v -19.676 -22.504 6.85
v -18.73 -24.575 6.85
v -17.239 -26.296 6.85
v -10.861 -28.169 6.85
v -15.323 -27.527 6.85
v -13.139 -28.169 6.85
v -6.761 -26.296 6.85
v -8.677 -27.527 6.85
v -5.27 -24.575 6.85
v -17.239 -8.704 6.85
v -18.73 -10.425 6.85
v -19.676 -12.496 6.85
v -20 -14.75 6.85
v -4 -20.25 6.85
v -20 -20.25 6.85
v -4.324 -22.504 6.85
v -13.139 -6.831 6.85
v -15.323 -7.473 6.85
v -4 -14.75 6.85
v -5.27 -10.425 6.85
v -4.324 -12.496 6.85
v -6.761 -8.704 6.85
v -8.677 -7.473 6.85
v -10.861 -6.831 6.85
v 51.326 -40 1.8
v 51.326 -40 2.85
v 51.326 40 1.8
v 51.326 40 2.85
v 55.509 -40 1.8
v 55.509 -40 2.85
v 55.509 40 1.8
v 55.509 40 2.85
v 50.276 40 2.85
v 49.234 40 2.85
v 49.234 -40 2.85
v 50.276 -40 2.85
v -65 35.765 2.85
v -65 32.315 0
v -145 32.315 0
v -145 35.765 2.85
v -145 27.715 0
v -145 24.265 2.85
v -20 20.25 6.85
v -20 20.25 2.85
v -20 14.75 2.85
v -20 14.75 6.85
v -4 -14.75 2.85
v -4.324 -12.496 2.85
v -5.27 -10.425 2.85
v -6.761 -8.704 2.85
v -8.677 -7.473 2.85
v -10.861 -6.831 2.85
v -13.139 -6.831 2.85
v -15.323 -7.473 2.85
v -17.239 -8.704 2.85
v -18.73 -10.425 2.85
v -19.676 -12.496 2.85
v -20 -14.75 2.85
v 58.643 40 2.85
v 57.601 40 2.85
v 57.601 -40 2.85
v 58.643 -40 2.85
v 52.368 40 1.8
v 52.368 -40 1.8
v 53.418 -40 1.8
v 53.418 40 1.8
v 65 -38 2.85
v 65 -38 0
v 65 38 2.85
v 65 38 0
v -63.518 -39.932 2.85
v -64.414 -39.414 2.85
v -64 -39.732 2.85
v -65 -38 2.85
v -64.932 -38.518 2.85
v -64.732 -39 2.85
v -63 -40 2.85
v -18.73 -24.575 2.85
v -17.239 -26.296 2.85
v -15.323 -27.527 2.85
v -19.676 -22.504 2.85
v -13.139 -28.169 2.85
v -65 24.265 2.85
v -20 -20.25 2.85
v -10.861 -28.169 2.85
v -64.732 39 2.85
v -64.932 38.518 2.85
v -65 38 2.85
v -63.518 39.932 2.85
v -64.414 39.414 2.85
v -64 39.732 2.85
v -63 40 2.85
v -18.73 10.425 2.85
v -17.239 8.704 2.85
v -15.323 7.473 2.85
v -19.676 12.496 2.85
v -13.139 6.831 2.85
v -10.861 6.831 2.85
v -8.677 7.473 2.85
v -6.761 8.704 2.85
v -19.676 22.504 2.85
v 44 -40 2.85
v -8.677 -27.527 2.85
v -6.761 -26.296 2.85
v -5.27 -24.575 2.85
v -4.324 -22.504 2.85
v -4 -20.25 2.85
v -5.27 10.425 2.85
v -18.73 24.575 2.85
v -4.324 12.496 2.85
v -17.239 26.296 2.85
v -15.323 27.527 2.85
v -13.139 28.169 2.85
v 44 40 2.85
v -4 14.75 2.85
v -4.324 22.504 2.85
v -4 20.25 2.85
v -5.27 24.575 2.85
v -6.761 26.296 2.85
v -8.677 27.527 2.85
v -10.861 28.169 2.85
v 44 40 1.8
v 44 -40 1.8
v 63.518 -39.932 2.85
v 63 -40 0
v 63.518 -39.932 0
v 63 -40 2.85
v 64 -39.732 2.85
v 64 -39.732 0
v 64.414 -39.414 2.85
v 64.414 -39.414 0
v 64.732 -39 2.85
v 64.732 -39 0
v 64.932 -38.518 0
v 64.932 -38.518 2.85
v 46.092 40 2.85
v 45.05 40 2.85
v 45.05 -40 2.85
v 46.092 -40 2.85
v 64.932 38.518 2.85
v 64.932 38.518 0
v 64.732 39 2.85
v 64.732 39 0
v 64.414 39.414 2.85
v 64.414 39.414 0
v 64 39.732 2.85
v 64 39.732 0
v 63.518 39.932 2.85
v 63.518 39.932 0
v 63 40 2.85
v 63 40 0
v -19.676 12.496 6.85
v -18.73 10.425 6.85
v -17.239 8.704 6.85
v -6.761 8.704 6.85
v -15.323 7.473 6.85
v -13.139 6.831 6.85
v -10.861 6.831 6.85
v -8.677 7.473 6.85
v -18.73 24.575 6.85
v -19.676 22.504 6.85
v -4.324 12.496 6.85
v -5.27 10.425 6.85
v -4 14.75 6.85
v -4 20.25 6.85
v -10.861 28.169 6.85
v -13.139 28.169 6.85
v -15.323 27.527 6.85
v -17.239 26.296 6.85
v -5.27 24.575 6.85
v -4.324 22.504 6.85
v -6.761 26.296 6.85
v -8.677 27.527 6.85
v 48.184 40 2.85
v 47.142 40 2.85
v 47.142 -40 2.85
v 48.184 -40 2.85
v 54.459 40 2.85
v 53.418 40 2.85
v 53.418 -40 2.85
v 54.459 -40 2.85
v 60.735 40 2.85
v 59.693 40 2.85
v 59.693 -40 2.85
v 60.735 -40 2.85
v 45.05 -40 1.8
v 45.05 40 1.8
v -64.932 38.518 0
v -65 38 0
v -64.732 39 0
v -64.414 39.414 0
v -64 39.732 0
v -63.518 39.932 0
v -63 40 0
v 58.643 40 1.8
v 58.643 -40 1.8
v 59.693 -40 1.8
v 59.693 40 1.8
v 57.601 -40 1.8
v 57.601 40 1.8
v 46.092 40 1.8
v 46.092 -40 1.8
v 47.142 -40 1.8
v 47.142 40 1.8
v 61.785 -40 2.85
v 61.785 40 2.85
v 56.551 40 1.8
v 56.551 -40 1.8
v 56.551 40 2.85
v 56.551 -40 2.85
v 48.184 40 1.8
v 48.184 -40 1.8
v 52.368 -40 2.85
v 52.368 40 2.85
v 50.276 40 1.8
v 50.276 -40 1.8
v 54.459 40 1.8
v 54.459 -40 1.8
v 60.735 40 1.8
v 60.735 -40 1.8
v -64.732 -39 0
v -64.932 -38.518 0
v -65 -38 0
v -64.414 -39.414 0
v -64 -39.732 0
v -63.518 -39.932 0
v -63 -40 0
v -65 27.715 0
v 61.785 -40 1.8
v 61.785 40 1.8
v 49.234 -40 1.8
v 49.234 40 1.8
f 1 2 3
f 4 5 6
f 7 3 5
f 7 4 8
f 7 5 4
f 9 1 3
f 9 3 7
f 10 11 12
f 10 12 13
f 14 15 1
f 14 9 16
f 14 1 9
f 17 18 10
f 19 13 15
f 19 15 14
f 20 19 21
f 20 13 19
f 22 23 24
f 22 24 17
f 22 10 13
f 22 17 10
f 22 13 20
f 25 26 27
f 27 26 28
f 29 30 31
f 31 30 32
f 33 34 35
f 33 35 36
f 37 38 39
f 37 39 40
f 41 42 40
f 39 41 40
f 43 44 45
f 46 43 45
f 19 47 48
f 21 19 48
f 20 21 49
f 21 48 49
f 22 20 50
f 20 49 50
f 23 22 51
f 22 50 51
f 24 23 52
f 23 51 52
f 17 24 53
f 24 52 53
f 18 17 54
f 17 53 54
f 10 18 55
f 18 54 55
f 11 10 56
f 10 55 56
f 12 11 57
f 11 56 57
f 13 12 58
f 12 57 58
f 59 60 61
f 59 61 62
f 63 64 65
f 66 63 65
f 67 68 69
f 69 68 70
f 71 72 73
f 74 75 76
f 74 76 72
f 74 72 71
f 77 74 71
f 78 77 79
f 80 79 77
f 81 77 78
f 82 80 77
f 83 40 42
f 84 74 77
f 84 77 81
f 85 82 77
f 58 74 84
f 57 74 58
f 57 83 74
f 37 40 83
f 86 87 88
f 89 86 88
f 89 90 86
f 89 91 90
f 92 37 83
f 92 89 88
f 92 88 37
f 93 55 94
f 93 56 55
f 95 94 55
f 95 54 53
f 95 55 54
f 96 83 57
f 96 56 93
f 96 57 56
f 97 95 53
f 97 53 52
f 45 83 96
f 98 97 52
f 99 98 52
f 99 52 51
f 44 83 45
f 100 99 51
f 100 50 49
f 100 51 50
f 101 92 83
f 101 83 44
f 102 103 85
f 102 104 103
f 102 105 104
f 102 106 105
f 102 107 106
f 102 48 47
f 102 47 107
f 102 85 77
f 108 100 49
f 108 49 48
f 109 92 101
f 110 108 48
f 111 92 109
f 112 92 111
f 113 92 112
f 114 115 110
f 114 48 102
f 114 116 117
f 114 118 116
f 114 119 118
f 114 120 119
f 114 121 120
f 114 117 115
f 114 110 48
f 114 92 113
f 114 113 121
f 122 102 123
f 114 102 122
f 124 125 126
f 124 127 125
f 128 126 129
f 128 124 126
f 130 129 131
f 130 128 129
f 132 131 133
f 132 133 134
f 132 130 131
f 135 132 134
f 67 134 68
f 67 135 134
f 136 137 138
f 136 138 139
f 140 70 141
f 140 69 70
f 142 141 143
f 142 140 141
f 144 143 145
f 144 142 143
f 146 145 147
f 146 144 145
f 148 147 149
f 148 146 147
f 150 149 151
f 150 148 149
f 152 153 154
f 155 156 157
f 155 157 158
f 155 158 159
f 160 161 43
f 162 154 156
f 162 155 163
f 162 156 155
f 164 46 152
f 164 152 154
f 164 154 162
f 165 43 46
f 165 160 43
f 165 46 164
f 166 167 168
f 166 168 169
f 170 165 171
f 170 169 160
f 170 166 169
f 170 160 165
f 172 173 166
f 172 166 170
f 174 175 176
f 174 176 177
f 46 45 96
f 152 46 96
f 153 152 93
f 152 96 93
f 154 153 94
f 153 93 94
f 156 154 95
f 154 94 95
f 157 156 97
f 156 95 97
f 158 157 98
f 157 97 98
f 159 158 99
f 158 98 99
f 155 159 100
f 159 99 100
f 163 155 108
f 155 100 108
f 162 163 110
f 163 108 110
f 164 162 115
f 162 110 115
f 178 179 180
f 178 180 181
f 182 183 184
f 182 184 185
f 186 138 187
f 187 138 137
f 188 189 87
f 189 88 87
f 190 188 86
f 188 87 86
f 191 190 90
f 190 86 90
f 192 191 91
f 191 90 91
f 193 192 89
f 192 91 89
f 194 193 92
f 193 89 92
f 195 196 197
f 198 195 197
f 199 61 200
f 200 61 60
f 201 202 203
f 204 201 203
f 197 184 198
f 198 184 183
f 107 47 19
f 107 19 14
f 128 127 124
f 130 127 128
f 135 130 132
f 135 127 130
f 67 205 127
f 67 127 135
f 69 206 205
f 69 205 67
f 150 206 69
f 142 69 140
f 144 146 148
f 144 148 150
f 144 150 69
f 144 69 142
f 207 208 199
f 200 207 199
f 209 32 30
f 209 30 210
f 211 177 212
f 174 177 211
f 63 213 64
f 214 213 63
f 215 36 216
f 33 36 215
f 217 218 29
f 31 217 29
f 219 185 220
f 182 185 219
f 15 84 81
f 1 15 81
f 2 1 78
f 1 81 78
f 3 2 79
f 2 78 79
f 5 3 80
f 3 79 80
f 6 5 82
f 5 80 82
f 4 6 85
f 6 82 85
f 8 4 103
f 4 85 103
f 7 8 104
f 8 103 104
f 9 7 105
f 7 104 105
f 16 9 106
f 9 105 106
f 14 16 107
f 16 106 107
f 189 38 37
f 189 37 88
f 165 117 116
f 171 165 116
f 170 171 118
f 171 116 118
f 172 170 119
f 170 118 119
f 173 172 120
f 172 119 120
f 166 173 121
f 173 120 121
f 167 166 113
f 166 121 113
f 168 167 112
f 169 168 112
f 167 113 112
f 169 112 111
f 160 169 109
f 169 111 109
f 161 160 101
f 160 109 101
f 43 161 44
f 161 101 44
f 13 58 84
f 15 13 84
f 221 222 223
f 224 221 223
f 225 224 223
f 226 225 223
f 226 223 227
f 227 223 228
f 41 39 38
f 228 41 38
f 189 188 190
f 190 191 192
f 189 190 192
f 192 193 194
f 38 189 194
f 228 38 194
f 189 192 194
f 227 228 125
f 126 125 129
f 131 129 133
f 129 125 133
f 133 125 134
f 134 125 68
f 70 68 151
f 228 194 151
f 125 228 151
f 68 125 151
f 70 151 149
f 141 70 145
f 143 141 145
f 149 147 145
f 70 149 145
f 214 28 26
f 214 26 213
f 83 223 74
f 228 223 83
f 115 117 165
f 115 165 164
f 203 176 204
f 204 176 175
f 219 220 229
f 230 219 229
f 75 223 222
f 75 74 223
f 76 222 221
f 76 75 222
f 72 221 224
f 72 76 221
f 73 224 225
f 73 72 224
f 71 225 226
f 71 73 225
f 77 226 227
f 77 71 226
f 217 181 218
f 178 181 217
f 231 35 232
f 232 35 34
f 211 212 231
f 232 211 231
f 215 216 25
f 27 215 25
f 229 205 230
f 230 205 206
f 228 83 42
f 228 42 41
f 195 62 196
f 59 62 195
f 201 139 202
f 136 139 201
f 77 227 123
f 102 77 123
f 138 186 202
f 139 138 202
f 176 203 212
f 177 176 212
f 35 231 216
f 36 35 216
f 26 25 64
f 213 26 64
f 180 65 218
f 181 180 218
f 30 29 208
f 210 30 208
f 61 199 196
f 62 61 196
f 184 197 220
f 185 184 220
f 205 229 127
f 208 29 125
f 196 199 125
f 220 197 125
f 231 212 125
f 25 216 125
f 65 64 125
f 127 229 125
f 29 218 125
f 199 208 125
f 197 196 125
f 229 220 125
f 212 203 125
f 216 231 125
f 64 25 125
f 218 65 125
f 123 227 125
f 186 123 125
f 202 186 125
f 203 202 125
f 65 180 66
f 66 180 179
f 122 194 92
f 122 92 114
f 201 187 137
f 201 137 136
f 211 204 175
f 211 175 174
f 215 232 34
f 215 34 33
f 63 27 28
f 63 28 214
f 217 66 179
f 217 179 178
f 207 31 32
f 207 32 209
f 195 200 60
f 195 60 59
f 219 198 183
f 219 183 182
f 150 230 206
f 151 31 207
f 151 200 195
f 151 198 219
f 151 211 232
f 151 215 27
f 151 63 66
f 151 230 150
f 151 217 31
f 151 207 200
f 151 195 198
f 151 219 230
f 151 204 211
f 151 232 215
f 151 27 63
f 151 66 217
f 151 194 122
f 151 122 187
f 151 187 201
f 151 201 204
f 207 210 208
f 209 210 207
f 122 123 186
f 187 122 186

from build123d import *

# Parameters (mm, degrees)
SKETCH_W     = 130
SKETCH_H     = 80
PAD_DEPTH    = 2.85
PAD001_DEPTH = 4
PAD002_DEPTH = 80
FILLET_R     = 2
SKETCH003_W  = 1.05
SKETCH003_H  = 80
POCKET_DEPTH = 1.05


with BuildPart() as part:
    # Sketch → Pad (new body)
    with BuildSketch(Plane.XY):
        Rectangle(SKETCH_W, SKETCH_H)
    extrude(amount=PAD_DEPTH)

    # Sketch001 (on Face6 of Pad) → Pad001 (join)
    with BuildSketch(Plane.XY.offset(2.85)):
        with BuildLine():
            ThreePointArc((-20, 14.75), (-12, 6.75), (-4, 14.75))
            Line((-4, 20.25), (-4, 14.75))
            ThreePointArc((-4, 20.25), (-11.999999, 28.250003), (-20, 20.250002))
            Line((-20, 20.250002), (-20, 14.75))
        make_face()
        with BuildLine():
            ThreePointArc((-20, -20.25), (-12, -28.25), (-4, -20.25))
            Line((-4, -14.75), (-4, -20.25))
            ThreePointArc((-4, -14.75), (-12, -6.75), (-20, -14.75))
            Line((-20, -14.75), (-20, -20.25))
        make_face()
    extrude(amount=PAD001_DEPTH)

    # Sketch002 (on Face2 of Pad001) → Pad002 (join)
    with BuildSketch(Plane(origin=(-65, 0, 0), x_dir=(0, -1, 0), z_dir=(-1, 0, 0))):
        Polygon((-35.765375, 2.85), (-24.265375, 2.85), (-27.715375, 0), (-32.315375, 0), align=None)
    extrude(amount=PAD002_DEPTH)

    # Fillet
    fillet_edges = [part.edges().sort_by_distance(p)[0] for p in [
        (-65, -40, 1.425),
        (65, -40, 1.425),
        (65, 40, 1.425),
        (-65, 40, 1.425),
    ]]
    fillet(fillet_edges, radius=FILLET_R)

    # Sketch003 (on Face5 of Fillet) → Pocket (cut)
    with BuildSketch(Plane.XY.offset(2.85)):
        with Locations((44.525, 0)):
            Rectangle(SKETCH003_W, SKETCH003_H)
        with Locations((46.616892, 0)):
            Rectangle(SKETCH003_W, SKETCH003_H)
        with Locations((48.708784, 0)):
            Rectangle(SKETCH003_W, SKETCH003_H)
        with Locations((50.800676, 0)):
            Rectangle(SKETCH003_W, SKETCH003_H)
        with Locations((52.892568, 0)):
            Rectangle(SKETCH003_W, SKETCH003_H)
        with Locations((54.98446, 0)):
            Rectangle(SKETCH003_W, SKETCH003_H)
        with Locations((57.076352, 0)):
            Rectangle(SKETCH003_W, SKETCH003_H)
        with Locations((59.168244, 0)):
            Rectangle(SKETCH003_W, SKETCH003_H)
        with Locations((61.260136, 0)):
            Rectangle(SKETCH003_W, SKETCH003_H)
    extrude(amount=-POCKET_DEPTH, mode=Mode.SUBTRACT)


solid = part.part
